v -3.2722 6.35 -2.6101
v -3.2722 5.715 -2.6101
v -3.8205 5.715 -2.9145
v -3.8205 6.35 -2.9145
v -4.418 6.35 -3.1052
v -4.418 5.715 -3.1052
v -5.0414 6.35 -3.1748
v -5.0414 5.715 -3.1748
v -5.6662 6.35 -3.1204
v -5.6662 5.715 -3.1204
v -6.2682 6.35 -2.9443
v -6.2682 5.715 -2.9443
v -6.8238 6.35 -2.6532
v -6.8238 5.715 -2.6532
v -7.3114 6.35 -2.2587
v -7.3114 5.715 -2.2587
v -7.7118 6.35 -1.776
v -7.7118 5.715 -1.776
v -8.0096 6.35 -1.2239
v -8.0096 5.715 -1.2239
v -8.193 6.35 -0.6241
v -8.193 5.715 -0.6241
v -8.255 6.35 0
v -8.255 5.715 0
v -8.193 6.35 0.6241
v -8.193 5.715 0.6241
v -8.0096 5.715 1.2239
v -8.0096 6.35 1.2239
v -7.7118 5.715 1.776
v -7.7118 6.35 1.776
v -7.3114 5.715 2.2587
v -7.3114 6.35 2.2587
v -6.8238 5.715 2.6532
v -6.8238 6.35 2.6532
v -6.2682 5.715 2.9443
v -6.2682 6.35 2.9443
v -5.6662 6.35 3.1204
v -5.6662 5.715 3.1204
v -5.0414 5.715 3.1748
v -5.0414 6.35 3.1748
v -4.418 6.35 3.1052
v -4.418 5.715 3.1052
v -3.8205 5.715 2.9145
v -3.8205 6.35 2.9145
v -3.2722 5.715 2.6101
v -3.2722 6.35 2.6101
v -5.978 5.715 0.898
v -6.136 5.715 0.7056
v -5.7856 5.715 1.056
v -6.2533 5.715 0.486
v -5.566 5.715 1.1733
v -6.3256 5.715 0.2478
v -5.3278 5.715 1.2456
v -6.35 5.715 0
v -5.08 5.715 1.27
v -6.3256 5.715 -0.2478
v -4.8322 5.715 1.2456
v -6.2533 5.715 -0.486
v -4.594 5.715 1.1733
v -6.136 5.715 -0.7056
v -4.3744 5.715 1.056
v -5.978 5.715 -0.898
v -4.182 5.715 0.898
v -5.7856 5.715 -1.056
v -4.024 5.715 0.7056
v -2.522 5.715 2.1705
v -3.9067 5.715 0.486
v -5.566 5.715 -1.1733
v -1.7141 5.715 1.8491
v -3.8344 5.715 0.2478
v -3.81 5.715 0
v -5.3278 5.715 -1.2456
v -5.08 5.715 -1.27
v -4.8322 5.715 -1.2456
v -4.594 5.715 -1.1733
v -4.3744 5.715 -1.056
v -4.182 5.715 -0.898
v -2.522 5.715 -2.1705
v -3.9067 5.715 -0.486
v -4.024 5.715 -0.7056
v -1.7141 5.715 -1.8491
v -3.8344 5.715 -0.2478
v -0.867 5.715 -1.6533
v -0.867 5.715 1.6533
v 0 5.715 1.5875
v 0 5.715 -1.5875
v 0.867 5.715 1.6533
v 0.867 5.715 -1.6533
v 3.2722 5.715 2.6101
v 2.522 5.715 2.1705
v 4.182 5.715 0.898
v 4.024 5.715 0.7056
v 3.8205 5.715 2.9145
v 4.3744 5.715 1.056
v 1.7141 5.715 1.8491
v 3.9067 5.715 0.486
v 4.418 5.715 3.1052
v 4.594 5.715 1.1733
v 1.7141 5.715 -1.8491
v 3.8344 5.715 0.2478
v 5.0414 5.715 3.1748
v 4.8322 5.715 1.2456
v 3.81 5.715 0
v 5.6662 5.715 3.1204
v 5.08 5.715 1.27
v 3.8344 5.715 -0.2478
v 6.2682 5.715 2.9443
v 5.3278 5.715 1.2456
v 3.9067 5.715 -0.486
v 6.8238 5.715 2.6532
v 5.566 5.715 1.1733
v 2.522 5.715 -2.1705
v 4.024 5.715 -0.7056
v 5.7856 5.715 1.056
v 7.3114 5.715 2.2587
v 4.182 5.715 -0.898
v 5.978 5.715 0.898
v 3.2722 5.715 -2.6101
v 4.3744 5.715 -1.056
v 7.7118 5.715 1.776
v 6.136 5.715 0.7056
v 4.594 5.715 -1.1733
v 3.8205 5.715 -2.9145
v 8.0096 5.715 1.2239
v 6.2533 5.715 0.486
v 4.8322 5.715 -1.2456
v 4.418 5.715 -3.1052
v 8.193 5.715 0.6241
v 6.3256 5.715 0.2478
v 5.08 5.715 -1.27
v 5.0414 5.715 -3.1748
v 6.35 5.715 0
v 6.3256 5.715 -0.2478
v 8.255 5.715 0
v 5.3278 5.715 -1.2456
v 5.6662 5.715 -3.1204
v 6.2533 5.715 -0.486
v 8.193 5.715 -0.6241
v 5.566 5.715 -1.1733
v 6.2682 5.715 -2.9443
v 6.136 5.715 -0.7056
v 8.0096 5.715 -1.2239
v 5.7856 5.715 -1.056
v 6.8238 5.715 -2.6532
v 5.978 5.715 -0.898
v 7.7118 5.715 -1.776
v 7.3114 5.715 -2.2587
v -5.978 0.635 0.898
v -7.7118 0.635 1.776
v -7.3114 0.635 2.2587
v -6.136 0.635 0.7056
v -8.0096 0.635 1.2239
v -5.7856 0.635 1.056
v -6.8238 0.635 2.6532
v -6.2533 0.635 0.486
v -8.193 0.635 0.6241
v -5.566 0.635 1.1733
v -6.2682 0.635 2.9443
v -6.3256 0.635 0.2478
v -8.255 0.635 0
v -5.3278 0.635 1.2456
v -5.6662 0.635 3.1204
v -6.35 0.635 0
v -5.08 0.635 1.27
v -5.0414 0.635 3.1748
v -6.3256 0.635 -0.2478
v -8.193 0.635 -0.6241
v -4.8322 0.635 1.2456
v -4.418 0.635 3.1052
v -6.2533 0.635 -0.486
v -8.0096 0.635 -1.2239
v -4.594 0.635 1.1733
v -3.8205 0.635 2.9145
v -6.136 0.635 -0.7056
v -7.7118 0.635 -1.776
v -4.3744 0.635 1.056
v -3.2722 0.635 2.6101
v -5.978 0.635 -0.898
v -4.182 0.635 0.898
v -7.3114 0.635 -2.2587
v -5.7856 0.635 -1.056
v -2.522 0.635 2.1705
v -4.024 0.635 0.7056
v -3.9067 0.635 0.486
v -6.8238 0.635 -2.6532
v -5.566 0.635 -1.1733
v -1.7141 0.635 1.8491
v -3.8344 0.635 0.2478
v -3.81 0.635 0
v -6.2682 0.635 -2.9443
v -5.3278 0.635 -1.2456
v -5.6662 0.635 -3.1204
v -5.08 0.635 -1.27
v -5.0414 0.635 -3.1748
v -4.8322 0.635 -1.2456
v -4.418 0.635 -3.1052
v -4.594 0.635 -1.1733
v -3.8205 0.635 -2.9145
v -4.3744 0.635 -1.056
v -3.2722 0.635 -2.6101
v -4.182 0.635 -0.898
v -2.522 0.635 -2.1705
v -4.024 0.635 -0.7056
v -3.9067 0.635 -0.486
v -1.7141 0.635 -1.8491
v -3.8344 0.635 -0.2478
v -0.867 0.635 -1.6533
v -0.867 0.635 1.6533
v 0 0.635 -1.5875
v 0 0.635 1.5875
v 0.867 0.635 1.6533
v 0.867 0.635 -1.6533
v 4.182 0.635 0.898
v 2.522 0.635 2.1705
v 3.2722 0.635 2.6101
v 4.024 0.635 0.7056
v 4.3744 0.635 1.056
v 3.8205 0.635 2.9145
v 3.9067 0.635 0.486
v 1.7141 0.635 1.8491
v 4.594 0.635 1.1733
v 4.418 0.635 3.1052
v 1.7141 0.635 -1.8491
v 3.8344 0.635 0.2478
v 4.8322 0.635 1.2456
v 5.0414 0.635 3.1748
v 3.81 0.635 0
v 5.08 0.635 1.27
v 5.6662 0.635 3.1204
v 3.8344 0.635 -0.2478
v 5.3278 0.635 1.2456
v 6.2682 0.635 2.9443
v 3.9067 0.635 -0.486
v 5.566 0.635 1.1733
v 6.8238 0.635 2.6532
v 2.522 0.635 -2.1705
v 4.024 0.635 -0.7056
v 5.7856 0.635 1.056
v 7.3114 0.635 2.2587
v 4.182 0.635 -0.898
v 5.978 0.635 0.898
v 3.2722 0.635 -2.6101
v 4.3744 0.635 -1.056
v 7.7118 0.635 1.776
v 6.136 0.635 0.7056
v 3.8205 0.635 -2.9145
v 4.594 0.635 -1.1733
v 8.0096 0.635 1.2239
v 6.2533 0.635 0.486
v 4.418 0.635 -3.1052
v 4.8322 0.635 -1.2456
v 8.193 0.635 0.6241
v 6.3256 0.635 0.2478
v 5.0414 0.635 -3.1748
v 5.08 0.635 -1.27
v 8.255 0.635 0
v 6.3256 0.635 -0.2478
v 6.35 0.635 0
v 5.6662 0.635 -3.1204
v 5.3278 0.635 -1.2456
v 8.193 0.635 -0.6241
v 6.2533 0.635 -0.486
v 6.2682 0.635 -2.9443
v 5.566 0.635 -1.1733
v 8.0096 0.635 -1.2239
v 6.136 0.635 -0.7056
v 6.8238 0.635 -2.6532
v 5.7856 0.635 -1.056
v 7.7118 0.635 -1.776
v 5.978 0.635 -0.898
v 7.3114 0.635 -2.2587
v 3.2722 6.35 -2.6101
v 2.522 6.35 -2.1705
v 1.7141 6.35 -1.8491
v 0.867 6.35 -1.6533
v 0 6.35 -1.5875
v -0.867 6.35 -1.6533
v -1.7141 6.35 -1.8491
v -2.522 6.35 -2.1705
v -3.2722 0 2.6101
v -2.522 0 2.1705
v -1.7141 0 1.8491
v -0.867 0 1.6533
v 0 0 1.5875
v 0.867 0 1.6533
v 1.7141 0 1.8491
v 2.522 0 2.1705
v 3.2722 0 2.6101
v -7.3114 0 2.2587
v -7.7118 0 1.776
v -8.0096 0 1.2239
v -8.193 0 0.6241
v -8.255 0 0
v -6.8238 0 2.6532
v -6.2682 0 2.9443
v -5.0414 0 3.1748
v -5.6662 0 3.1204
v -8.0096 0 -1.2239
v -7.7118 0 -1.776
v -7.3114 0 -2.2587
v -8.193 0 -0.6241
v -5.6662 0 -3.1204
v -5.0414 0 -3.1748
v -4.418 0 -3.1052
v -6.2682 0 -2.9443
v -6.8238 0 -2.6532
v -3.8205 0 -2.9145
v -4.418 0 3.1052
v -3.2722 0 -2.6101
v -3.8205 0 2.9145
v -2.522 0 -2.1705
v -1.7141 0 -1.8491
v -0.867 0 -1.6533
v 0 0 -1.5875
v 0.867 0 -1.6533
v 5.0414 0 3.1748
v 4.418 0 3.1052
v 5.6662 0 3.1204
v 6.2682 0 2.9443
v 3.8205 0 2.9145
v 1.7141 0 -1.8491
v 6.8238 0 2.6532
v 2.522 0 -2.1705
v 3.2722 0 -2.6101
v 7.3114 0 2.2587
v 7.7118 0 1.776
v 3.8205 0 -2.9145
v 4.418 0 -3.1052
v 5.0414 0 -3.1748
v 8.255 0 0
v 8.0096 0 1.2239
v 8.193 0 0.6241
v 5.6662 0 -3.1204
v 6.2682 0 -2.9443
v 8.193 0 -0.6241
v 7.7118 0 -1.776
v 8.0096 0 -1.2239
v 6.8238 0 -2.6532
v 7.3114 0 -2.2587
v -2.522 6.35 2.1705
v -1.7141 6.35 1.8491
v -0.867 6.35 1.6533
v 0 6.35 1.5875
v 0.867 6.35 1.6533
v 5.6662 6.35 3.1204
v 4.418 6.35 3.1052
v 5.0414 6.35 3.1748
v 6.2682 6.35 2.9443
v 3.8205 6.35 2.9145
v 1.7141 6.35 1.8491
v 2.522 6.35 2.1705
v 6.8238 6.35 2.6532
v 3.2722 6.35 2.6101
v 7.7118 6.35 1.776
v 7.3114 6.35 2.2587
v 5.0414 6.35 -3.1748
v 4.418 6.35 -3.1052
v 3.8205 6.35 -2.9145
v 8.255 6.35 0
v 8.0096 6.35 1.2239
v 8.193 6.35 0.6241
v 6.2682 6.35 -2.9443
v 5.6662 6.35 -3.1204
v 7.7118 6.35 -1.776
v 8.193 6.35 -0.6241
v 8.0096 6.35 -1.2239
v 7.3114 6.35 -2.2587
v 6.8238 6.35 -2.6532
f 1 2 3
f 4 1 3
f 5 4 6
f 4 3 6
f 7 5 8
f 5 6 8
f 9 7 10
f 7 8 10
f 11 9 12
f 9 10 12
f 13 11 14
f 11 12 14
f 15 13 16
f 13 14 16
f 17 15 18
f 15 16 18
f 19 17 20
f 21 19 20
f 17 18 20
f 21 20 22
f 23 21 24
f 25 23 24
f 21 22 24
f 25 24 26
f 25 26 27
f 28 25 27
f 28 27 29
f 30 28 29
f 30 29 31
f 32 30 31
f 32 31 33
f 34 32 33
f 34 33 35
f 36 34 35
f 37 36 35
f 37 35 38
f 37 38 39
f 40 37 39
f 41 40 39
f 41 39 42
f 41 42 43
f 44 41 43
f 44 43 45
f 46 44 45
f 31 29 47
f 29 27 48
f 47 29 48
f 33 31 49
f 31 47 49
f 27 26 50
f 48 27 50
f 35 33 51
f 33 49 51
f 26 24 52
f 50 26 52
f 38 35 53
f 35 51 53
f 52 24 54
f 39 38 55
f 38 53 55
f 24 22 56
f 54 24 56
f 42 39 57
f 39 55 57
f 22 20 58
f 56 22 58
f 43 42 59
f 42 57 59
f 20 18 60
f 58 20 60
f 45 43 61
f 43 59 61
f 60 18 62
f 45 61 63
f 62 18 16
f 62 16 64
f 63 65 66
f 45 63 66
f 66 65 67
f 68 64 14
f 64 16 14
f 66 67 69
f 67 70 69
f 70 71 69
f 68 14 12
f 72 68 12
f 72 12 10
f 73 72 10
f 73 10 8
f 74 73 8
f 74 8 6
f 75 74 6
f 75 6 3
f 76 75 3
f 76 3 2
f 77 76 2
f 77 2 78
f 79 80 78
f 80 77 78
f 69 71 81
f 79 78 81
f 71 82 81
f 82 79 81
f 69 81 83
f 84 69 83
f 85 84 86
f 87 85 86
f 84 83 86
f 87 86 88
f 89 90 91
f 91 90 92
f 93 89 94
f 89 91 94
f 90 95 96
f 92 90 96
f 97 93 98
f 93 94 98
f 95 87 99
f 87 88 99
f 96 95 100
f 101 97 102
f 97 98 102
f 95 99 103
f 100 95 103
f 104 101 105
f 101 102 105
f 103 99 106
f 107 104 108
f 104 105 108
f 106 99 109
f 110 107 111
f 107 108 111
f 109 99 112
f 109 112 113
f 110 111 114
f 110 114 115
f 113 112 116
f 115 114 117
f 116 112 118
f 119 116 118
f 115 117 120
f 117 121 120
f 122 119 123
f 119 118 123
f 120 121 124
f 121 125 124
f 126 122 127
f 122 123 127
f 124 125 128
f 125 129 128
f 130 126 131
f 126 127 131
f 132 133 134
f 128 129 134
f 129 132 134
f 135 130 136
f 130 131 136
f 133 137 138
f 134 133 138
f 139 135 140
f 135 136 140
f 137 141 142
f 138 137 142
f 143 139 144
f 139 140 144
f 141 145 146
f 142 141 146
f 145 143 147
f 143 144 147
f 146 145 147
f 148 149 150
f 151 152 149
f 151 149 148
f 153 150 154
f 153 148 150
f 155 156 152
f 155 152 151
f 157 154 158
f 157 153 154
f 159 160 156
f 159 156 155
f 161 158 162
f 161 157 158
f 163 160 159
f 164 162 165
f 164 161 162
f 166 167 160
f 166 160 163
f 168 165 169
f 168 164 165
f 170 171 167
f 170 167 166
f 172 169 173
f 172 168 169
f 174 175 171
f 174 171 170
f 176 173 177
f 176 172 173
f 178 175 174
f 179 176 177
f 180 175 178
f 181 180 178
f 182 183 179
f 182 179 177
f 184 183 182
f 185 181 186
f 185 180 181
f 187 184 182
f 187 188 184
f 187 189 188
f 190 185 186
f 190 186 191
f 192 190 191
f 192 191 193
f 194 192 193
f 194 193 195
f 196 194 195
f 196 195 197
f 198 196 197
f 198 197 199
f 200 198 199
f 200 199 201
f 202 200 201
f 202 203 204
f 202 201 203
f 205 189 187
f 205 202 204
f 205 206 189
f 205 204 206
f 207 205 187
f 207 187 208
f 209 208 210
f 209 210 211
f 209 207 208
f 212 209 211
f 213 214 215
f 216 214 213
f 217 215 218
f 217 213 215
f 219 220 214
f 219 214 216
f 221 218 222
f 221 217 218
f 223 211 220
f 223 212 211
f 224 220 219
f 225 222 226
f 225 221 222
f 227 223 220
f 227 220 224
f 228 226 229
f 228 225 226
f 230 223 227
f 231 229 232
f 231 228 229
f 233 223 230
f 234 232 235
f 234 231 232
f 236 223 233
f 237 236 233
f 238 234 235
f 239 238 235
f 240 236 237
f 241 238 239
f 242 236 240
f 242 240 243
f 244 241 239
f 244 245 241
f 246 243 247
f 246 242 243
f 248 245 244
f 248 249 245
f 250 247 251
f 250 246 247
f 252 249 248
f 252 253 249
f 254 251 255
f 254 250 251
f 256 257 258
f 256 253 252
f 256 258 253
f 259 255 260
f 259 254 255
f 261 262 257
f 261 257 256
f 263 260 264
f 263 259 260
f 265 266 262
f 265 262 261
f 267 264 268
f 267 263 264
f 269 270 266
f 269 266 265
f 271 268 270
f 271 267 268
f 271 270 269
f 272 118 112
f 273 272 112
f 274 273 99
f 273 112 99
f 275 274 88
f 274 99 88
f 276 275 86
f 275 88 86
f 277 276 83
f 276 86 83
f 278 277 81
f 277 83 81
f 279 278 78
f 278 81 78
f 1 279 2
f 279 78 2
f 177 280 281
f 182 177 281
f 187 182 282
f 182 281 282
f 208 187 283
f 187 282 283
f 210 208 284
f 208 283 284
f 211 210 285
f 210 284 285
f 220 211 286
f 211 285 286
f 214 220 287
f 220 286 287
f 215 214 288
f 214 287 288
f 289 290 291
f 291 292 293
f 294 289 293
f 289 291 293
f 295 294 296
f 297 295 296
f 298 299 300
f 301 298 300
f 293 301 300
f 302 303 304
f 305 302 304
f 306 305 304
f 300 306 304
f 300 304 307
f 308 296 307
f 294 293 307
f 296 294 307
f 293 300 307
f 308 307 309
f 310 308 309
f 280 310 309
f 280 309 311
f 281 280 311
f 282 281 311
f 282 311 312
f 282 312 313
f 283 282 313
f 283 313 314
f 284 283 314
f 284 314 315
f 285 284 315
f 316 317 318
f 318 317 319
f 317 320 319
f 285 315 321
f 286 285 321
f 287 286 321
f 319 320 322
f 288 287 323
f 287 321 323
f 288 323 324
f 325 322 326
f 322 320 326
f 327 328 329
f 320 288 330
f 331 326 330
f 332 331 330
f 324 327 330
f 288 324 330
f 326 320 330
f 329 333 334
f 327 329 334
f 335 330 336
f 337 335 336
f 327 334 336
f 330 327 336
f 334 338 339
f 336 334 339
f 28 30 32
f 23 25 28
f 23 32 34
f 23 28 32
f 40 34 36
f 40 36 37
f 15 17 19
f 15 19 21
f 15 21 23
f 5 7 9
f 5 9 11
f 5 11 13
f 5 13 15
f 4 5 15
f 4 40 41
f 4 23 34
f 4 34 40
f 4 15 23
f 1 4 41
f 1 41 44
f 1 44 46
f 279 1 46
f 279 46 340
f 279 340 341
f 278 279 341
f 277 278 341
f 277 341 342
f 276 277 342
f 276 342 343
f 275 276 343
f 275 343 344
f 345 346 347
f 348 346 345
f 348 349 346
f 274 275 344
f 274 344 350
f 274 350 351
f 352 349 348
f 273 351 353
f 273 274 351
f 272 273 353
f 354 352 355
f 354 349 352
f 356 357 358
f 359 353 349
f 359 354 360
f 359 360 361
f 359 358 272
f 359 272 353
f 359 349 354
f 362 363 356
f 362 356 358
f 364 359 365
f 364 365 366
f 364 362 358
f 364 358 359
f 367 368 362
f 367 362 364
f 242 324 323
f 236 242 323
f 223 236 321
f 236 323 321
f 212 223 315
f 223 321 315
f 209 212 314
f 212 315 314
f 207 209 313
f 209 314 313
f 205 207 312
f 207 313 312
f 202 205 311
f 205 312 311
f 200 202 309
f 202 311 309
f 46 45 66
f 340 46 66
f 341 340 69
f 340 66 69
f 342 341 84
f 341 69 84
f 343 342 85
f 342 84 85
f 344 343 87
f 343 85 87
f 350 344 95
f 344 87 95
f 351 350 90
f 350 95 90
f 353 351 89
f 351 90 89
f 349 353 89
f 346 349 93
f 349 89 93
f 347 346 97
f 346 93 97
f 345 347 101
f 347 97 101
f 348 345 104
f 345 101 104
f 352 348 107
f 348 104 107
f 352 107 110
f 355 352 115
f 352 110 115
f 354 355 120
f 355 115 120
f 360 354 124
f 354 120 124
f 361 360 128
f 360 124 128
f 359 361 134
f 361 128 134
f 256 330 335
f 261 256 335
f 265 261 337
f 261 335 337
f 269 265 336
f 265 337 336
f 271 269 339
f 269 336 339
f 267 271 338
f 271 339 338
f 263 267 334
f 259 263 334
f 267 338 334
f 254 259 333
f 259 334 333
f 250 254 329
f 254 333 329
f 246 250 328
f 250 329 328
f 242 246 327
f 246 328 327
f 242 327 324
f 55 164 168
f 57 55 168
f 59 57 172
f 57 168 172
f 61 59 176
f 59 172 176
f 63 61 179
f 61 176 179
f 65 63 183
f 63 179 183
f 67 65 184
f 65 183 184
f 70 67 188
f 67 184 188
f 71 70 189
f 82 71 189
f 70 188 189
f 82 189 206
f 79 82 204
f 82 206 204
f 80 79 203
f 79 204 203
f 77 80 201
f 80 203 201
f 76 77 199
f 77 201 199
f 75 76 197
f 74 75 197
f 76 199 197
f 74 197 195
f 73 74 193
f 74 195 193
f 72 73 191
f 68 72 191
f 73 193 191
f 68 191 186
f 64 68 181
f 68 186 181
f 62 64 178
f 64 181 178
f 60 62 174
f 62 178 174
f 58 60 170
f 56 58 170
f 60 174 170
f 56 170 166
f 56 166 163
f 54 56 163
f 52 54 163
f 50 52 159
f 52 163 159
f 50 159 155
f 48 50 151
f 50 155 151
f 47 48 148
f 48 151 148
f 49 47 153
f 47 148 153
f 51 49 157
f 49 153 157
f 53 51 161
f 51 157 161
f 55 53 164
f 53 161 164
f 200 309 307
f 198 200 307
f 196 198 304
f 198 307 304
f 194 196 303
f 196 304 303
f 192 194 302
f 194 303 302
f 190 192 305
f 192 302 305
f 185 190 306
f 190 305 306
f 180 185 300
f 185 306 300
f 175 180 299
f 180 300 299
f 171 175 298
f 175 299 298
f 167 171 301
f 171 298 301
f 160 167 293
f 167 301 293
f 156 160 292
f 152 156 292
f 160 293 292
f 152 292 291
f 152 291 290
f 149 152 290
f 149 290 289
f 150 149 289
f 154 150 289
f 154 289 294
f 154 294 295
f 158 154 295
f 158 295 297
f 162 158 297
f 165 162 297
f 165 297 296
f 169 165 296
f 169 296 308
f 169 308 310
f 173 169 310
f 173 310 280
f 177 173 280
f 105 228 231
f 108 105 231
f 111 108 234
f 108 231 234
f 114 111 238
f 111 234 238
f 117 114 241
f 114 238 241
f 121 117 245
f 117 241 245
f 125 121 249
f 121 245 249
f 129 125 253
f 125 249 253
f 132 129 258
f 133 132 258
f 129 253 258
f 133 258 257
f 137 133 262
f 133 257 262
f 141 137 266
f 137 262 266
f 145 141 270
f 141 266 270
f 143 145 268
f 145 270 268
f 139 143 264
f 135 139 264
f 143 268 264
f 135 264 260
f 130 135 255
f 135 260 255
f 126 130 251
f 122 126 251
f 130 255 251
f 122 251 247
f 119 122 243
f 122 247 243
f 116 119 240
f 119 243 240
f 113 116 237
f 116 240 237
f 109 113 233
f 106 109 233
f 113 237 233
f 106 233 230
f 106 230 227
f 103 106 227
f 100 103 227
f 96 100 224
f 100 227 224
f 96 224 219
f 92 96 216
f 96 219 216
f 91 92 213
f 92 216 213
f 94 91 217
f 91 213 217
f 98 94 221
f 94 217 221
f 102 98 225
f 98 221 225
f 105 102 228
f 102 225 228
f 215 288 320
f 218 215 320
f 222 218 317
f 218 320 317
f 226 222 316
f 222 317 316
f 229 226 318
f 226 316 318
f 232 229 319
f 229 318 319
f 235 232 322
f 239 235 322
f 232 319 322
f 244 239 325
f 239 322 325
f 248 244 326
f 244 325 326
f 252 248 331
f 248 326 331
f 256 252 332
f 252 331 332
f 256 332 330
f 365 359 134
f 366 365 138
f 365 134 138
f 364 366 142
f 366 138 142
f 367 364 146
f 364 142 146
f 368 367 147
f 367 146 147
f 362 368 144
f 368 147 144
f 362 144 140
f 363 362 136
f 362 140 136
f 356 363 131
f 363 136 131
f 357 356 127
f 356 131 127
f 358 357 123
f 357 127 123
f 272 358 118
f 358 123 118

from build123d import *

# Parameters (mm, degrees)
BOSS_EXTRUDE1_DEPTH = 6.35
CUT_EXTRUDE1_START  = -5.715
SKETCH3_R           = 1.27
CUT_EXTRUDE1_DEPTH  = 5.08


with BuildPart() as part:
    # Sketch1 → Boss-Extrude1 (new body)
    with BuildSketch(Plane(origin=(0, 0, 0), x_dir=(1, 0, 0), z_dir=(0, 1, 0))):
        with BuildLine():
            ThreePointArc((-3.272170819, -2.610053381), (-2.267484875, -1.473222208), (-1.905, 0))
            ThreePointArc((-1.905, 0), (-2.267484875, 1.473222208), (-3.272170819, 2.610053381))
            ThreePointArc((-3.272170819, 2.610053381), (-8.255, 0), (-3.272170819, -2.610053381))
        make_face()
        with BuildLine():
            ThreePointArc((-3.272170819, 2.610053381), (-2.267484875, 1.473222208), (-1.905, 0))
            ThreePointArc((-1.905, 0), (-2.267484875, -1.473222208), (-3.272170819, -2.610053381))
            ThreePointArc((-3.272170819, -2.610053381), (0, -1.5875), (3.272170819, -2.610053381))
            ThreePointArc((3.272170819, -2.610053381), (1.905, 0), (3.272170819, 2.610053381))
            ThreePointArc((3.272170819, 2.610053381), (0, 1.5875), (-3.272170819, 2.610053381))
        make_face()
        with BuildLine():
            ThreePointArc((8.255, 0), (6.553222208, 2.812515125), (3.272170819, 2.610053381))
            ThreePointArc((3.272170819, 2.610053381), (1.905, 0), (3.272170819, -2.610053381))
            ThreePointArc((3.272170819, -2.610053381), (6.553222208, -2.812515125), (8.255, 0))
        make_face()
    extrude(amount=BOSS_EXTRUDE1_DEPTH)

    # Sketch3 → Cut-Extrude1 (cut)
    with BuildSketch(Plane(origin=(0, 6.35, 0), x_dir=(1, 0, 0), z_dir=(0, 1, 0)).offset(CUT_EXTRUDE1_START)):
        with BuildLine():
            ThreePointArc((3.272170819, 2.610053381), (0, 1.5875), (-3.272170819, 2.610053381))
            ThreePointArc((-3.272170819, 2.610053381), (-8.255, 0), (-3.272170819, -2.610053381))
            ThreePointArc((-3.272170819, -2.610053381), (0, -1.5875), (3.272170819, -2.610053381))
            ThreePointArc((3.272170819, -2.610053381), (8.255, 0), (3.272170819, 2.610053381))
        make_face()
        with Locations(Location((5.08, 0, 0), (0, 0, 270))):
            Circle(SKETCH3_R, mode=Mode.SUBTRACT)
        with Locations(Location((-5.08, 0, 0), (0, 0, 270))):
            Circle(SKETCH3_R, mode=Mode.SUBTRACT)
    extrude(amount=CUT_EXTRUDE1_DEPTH, mode=Mode.SUBTRACT)


solid = part.part
